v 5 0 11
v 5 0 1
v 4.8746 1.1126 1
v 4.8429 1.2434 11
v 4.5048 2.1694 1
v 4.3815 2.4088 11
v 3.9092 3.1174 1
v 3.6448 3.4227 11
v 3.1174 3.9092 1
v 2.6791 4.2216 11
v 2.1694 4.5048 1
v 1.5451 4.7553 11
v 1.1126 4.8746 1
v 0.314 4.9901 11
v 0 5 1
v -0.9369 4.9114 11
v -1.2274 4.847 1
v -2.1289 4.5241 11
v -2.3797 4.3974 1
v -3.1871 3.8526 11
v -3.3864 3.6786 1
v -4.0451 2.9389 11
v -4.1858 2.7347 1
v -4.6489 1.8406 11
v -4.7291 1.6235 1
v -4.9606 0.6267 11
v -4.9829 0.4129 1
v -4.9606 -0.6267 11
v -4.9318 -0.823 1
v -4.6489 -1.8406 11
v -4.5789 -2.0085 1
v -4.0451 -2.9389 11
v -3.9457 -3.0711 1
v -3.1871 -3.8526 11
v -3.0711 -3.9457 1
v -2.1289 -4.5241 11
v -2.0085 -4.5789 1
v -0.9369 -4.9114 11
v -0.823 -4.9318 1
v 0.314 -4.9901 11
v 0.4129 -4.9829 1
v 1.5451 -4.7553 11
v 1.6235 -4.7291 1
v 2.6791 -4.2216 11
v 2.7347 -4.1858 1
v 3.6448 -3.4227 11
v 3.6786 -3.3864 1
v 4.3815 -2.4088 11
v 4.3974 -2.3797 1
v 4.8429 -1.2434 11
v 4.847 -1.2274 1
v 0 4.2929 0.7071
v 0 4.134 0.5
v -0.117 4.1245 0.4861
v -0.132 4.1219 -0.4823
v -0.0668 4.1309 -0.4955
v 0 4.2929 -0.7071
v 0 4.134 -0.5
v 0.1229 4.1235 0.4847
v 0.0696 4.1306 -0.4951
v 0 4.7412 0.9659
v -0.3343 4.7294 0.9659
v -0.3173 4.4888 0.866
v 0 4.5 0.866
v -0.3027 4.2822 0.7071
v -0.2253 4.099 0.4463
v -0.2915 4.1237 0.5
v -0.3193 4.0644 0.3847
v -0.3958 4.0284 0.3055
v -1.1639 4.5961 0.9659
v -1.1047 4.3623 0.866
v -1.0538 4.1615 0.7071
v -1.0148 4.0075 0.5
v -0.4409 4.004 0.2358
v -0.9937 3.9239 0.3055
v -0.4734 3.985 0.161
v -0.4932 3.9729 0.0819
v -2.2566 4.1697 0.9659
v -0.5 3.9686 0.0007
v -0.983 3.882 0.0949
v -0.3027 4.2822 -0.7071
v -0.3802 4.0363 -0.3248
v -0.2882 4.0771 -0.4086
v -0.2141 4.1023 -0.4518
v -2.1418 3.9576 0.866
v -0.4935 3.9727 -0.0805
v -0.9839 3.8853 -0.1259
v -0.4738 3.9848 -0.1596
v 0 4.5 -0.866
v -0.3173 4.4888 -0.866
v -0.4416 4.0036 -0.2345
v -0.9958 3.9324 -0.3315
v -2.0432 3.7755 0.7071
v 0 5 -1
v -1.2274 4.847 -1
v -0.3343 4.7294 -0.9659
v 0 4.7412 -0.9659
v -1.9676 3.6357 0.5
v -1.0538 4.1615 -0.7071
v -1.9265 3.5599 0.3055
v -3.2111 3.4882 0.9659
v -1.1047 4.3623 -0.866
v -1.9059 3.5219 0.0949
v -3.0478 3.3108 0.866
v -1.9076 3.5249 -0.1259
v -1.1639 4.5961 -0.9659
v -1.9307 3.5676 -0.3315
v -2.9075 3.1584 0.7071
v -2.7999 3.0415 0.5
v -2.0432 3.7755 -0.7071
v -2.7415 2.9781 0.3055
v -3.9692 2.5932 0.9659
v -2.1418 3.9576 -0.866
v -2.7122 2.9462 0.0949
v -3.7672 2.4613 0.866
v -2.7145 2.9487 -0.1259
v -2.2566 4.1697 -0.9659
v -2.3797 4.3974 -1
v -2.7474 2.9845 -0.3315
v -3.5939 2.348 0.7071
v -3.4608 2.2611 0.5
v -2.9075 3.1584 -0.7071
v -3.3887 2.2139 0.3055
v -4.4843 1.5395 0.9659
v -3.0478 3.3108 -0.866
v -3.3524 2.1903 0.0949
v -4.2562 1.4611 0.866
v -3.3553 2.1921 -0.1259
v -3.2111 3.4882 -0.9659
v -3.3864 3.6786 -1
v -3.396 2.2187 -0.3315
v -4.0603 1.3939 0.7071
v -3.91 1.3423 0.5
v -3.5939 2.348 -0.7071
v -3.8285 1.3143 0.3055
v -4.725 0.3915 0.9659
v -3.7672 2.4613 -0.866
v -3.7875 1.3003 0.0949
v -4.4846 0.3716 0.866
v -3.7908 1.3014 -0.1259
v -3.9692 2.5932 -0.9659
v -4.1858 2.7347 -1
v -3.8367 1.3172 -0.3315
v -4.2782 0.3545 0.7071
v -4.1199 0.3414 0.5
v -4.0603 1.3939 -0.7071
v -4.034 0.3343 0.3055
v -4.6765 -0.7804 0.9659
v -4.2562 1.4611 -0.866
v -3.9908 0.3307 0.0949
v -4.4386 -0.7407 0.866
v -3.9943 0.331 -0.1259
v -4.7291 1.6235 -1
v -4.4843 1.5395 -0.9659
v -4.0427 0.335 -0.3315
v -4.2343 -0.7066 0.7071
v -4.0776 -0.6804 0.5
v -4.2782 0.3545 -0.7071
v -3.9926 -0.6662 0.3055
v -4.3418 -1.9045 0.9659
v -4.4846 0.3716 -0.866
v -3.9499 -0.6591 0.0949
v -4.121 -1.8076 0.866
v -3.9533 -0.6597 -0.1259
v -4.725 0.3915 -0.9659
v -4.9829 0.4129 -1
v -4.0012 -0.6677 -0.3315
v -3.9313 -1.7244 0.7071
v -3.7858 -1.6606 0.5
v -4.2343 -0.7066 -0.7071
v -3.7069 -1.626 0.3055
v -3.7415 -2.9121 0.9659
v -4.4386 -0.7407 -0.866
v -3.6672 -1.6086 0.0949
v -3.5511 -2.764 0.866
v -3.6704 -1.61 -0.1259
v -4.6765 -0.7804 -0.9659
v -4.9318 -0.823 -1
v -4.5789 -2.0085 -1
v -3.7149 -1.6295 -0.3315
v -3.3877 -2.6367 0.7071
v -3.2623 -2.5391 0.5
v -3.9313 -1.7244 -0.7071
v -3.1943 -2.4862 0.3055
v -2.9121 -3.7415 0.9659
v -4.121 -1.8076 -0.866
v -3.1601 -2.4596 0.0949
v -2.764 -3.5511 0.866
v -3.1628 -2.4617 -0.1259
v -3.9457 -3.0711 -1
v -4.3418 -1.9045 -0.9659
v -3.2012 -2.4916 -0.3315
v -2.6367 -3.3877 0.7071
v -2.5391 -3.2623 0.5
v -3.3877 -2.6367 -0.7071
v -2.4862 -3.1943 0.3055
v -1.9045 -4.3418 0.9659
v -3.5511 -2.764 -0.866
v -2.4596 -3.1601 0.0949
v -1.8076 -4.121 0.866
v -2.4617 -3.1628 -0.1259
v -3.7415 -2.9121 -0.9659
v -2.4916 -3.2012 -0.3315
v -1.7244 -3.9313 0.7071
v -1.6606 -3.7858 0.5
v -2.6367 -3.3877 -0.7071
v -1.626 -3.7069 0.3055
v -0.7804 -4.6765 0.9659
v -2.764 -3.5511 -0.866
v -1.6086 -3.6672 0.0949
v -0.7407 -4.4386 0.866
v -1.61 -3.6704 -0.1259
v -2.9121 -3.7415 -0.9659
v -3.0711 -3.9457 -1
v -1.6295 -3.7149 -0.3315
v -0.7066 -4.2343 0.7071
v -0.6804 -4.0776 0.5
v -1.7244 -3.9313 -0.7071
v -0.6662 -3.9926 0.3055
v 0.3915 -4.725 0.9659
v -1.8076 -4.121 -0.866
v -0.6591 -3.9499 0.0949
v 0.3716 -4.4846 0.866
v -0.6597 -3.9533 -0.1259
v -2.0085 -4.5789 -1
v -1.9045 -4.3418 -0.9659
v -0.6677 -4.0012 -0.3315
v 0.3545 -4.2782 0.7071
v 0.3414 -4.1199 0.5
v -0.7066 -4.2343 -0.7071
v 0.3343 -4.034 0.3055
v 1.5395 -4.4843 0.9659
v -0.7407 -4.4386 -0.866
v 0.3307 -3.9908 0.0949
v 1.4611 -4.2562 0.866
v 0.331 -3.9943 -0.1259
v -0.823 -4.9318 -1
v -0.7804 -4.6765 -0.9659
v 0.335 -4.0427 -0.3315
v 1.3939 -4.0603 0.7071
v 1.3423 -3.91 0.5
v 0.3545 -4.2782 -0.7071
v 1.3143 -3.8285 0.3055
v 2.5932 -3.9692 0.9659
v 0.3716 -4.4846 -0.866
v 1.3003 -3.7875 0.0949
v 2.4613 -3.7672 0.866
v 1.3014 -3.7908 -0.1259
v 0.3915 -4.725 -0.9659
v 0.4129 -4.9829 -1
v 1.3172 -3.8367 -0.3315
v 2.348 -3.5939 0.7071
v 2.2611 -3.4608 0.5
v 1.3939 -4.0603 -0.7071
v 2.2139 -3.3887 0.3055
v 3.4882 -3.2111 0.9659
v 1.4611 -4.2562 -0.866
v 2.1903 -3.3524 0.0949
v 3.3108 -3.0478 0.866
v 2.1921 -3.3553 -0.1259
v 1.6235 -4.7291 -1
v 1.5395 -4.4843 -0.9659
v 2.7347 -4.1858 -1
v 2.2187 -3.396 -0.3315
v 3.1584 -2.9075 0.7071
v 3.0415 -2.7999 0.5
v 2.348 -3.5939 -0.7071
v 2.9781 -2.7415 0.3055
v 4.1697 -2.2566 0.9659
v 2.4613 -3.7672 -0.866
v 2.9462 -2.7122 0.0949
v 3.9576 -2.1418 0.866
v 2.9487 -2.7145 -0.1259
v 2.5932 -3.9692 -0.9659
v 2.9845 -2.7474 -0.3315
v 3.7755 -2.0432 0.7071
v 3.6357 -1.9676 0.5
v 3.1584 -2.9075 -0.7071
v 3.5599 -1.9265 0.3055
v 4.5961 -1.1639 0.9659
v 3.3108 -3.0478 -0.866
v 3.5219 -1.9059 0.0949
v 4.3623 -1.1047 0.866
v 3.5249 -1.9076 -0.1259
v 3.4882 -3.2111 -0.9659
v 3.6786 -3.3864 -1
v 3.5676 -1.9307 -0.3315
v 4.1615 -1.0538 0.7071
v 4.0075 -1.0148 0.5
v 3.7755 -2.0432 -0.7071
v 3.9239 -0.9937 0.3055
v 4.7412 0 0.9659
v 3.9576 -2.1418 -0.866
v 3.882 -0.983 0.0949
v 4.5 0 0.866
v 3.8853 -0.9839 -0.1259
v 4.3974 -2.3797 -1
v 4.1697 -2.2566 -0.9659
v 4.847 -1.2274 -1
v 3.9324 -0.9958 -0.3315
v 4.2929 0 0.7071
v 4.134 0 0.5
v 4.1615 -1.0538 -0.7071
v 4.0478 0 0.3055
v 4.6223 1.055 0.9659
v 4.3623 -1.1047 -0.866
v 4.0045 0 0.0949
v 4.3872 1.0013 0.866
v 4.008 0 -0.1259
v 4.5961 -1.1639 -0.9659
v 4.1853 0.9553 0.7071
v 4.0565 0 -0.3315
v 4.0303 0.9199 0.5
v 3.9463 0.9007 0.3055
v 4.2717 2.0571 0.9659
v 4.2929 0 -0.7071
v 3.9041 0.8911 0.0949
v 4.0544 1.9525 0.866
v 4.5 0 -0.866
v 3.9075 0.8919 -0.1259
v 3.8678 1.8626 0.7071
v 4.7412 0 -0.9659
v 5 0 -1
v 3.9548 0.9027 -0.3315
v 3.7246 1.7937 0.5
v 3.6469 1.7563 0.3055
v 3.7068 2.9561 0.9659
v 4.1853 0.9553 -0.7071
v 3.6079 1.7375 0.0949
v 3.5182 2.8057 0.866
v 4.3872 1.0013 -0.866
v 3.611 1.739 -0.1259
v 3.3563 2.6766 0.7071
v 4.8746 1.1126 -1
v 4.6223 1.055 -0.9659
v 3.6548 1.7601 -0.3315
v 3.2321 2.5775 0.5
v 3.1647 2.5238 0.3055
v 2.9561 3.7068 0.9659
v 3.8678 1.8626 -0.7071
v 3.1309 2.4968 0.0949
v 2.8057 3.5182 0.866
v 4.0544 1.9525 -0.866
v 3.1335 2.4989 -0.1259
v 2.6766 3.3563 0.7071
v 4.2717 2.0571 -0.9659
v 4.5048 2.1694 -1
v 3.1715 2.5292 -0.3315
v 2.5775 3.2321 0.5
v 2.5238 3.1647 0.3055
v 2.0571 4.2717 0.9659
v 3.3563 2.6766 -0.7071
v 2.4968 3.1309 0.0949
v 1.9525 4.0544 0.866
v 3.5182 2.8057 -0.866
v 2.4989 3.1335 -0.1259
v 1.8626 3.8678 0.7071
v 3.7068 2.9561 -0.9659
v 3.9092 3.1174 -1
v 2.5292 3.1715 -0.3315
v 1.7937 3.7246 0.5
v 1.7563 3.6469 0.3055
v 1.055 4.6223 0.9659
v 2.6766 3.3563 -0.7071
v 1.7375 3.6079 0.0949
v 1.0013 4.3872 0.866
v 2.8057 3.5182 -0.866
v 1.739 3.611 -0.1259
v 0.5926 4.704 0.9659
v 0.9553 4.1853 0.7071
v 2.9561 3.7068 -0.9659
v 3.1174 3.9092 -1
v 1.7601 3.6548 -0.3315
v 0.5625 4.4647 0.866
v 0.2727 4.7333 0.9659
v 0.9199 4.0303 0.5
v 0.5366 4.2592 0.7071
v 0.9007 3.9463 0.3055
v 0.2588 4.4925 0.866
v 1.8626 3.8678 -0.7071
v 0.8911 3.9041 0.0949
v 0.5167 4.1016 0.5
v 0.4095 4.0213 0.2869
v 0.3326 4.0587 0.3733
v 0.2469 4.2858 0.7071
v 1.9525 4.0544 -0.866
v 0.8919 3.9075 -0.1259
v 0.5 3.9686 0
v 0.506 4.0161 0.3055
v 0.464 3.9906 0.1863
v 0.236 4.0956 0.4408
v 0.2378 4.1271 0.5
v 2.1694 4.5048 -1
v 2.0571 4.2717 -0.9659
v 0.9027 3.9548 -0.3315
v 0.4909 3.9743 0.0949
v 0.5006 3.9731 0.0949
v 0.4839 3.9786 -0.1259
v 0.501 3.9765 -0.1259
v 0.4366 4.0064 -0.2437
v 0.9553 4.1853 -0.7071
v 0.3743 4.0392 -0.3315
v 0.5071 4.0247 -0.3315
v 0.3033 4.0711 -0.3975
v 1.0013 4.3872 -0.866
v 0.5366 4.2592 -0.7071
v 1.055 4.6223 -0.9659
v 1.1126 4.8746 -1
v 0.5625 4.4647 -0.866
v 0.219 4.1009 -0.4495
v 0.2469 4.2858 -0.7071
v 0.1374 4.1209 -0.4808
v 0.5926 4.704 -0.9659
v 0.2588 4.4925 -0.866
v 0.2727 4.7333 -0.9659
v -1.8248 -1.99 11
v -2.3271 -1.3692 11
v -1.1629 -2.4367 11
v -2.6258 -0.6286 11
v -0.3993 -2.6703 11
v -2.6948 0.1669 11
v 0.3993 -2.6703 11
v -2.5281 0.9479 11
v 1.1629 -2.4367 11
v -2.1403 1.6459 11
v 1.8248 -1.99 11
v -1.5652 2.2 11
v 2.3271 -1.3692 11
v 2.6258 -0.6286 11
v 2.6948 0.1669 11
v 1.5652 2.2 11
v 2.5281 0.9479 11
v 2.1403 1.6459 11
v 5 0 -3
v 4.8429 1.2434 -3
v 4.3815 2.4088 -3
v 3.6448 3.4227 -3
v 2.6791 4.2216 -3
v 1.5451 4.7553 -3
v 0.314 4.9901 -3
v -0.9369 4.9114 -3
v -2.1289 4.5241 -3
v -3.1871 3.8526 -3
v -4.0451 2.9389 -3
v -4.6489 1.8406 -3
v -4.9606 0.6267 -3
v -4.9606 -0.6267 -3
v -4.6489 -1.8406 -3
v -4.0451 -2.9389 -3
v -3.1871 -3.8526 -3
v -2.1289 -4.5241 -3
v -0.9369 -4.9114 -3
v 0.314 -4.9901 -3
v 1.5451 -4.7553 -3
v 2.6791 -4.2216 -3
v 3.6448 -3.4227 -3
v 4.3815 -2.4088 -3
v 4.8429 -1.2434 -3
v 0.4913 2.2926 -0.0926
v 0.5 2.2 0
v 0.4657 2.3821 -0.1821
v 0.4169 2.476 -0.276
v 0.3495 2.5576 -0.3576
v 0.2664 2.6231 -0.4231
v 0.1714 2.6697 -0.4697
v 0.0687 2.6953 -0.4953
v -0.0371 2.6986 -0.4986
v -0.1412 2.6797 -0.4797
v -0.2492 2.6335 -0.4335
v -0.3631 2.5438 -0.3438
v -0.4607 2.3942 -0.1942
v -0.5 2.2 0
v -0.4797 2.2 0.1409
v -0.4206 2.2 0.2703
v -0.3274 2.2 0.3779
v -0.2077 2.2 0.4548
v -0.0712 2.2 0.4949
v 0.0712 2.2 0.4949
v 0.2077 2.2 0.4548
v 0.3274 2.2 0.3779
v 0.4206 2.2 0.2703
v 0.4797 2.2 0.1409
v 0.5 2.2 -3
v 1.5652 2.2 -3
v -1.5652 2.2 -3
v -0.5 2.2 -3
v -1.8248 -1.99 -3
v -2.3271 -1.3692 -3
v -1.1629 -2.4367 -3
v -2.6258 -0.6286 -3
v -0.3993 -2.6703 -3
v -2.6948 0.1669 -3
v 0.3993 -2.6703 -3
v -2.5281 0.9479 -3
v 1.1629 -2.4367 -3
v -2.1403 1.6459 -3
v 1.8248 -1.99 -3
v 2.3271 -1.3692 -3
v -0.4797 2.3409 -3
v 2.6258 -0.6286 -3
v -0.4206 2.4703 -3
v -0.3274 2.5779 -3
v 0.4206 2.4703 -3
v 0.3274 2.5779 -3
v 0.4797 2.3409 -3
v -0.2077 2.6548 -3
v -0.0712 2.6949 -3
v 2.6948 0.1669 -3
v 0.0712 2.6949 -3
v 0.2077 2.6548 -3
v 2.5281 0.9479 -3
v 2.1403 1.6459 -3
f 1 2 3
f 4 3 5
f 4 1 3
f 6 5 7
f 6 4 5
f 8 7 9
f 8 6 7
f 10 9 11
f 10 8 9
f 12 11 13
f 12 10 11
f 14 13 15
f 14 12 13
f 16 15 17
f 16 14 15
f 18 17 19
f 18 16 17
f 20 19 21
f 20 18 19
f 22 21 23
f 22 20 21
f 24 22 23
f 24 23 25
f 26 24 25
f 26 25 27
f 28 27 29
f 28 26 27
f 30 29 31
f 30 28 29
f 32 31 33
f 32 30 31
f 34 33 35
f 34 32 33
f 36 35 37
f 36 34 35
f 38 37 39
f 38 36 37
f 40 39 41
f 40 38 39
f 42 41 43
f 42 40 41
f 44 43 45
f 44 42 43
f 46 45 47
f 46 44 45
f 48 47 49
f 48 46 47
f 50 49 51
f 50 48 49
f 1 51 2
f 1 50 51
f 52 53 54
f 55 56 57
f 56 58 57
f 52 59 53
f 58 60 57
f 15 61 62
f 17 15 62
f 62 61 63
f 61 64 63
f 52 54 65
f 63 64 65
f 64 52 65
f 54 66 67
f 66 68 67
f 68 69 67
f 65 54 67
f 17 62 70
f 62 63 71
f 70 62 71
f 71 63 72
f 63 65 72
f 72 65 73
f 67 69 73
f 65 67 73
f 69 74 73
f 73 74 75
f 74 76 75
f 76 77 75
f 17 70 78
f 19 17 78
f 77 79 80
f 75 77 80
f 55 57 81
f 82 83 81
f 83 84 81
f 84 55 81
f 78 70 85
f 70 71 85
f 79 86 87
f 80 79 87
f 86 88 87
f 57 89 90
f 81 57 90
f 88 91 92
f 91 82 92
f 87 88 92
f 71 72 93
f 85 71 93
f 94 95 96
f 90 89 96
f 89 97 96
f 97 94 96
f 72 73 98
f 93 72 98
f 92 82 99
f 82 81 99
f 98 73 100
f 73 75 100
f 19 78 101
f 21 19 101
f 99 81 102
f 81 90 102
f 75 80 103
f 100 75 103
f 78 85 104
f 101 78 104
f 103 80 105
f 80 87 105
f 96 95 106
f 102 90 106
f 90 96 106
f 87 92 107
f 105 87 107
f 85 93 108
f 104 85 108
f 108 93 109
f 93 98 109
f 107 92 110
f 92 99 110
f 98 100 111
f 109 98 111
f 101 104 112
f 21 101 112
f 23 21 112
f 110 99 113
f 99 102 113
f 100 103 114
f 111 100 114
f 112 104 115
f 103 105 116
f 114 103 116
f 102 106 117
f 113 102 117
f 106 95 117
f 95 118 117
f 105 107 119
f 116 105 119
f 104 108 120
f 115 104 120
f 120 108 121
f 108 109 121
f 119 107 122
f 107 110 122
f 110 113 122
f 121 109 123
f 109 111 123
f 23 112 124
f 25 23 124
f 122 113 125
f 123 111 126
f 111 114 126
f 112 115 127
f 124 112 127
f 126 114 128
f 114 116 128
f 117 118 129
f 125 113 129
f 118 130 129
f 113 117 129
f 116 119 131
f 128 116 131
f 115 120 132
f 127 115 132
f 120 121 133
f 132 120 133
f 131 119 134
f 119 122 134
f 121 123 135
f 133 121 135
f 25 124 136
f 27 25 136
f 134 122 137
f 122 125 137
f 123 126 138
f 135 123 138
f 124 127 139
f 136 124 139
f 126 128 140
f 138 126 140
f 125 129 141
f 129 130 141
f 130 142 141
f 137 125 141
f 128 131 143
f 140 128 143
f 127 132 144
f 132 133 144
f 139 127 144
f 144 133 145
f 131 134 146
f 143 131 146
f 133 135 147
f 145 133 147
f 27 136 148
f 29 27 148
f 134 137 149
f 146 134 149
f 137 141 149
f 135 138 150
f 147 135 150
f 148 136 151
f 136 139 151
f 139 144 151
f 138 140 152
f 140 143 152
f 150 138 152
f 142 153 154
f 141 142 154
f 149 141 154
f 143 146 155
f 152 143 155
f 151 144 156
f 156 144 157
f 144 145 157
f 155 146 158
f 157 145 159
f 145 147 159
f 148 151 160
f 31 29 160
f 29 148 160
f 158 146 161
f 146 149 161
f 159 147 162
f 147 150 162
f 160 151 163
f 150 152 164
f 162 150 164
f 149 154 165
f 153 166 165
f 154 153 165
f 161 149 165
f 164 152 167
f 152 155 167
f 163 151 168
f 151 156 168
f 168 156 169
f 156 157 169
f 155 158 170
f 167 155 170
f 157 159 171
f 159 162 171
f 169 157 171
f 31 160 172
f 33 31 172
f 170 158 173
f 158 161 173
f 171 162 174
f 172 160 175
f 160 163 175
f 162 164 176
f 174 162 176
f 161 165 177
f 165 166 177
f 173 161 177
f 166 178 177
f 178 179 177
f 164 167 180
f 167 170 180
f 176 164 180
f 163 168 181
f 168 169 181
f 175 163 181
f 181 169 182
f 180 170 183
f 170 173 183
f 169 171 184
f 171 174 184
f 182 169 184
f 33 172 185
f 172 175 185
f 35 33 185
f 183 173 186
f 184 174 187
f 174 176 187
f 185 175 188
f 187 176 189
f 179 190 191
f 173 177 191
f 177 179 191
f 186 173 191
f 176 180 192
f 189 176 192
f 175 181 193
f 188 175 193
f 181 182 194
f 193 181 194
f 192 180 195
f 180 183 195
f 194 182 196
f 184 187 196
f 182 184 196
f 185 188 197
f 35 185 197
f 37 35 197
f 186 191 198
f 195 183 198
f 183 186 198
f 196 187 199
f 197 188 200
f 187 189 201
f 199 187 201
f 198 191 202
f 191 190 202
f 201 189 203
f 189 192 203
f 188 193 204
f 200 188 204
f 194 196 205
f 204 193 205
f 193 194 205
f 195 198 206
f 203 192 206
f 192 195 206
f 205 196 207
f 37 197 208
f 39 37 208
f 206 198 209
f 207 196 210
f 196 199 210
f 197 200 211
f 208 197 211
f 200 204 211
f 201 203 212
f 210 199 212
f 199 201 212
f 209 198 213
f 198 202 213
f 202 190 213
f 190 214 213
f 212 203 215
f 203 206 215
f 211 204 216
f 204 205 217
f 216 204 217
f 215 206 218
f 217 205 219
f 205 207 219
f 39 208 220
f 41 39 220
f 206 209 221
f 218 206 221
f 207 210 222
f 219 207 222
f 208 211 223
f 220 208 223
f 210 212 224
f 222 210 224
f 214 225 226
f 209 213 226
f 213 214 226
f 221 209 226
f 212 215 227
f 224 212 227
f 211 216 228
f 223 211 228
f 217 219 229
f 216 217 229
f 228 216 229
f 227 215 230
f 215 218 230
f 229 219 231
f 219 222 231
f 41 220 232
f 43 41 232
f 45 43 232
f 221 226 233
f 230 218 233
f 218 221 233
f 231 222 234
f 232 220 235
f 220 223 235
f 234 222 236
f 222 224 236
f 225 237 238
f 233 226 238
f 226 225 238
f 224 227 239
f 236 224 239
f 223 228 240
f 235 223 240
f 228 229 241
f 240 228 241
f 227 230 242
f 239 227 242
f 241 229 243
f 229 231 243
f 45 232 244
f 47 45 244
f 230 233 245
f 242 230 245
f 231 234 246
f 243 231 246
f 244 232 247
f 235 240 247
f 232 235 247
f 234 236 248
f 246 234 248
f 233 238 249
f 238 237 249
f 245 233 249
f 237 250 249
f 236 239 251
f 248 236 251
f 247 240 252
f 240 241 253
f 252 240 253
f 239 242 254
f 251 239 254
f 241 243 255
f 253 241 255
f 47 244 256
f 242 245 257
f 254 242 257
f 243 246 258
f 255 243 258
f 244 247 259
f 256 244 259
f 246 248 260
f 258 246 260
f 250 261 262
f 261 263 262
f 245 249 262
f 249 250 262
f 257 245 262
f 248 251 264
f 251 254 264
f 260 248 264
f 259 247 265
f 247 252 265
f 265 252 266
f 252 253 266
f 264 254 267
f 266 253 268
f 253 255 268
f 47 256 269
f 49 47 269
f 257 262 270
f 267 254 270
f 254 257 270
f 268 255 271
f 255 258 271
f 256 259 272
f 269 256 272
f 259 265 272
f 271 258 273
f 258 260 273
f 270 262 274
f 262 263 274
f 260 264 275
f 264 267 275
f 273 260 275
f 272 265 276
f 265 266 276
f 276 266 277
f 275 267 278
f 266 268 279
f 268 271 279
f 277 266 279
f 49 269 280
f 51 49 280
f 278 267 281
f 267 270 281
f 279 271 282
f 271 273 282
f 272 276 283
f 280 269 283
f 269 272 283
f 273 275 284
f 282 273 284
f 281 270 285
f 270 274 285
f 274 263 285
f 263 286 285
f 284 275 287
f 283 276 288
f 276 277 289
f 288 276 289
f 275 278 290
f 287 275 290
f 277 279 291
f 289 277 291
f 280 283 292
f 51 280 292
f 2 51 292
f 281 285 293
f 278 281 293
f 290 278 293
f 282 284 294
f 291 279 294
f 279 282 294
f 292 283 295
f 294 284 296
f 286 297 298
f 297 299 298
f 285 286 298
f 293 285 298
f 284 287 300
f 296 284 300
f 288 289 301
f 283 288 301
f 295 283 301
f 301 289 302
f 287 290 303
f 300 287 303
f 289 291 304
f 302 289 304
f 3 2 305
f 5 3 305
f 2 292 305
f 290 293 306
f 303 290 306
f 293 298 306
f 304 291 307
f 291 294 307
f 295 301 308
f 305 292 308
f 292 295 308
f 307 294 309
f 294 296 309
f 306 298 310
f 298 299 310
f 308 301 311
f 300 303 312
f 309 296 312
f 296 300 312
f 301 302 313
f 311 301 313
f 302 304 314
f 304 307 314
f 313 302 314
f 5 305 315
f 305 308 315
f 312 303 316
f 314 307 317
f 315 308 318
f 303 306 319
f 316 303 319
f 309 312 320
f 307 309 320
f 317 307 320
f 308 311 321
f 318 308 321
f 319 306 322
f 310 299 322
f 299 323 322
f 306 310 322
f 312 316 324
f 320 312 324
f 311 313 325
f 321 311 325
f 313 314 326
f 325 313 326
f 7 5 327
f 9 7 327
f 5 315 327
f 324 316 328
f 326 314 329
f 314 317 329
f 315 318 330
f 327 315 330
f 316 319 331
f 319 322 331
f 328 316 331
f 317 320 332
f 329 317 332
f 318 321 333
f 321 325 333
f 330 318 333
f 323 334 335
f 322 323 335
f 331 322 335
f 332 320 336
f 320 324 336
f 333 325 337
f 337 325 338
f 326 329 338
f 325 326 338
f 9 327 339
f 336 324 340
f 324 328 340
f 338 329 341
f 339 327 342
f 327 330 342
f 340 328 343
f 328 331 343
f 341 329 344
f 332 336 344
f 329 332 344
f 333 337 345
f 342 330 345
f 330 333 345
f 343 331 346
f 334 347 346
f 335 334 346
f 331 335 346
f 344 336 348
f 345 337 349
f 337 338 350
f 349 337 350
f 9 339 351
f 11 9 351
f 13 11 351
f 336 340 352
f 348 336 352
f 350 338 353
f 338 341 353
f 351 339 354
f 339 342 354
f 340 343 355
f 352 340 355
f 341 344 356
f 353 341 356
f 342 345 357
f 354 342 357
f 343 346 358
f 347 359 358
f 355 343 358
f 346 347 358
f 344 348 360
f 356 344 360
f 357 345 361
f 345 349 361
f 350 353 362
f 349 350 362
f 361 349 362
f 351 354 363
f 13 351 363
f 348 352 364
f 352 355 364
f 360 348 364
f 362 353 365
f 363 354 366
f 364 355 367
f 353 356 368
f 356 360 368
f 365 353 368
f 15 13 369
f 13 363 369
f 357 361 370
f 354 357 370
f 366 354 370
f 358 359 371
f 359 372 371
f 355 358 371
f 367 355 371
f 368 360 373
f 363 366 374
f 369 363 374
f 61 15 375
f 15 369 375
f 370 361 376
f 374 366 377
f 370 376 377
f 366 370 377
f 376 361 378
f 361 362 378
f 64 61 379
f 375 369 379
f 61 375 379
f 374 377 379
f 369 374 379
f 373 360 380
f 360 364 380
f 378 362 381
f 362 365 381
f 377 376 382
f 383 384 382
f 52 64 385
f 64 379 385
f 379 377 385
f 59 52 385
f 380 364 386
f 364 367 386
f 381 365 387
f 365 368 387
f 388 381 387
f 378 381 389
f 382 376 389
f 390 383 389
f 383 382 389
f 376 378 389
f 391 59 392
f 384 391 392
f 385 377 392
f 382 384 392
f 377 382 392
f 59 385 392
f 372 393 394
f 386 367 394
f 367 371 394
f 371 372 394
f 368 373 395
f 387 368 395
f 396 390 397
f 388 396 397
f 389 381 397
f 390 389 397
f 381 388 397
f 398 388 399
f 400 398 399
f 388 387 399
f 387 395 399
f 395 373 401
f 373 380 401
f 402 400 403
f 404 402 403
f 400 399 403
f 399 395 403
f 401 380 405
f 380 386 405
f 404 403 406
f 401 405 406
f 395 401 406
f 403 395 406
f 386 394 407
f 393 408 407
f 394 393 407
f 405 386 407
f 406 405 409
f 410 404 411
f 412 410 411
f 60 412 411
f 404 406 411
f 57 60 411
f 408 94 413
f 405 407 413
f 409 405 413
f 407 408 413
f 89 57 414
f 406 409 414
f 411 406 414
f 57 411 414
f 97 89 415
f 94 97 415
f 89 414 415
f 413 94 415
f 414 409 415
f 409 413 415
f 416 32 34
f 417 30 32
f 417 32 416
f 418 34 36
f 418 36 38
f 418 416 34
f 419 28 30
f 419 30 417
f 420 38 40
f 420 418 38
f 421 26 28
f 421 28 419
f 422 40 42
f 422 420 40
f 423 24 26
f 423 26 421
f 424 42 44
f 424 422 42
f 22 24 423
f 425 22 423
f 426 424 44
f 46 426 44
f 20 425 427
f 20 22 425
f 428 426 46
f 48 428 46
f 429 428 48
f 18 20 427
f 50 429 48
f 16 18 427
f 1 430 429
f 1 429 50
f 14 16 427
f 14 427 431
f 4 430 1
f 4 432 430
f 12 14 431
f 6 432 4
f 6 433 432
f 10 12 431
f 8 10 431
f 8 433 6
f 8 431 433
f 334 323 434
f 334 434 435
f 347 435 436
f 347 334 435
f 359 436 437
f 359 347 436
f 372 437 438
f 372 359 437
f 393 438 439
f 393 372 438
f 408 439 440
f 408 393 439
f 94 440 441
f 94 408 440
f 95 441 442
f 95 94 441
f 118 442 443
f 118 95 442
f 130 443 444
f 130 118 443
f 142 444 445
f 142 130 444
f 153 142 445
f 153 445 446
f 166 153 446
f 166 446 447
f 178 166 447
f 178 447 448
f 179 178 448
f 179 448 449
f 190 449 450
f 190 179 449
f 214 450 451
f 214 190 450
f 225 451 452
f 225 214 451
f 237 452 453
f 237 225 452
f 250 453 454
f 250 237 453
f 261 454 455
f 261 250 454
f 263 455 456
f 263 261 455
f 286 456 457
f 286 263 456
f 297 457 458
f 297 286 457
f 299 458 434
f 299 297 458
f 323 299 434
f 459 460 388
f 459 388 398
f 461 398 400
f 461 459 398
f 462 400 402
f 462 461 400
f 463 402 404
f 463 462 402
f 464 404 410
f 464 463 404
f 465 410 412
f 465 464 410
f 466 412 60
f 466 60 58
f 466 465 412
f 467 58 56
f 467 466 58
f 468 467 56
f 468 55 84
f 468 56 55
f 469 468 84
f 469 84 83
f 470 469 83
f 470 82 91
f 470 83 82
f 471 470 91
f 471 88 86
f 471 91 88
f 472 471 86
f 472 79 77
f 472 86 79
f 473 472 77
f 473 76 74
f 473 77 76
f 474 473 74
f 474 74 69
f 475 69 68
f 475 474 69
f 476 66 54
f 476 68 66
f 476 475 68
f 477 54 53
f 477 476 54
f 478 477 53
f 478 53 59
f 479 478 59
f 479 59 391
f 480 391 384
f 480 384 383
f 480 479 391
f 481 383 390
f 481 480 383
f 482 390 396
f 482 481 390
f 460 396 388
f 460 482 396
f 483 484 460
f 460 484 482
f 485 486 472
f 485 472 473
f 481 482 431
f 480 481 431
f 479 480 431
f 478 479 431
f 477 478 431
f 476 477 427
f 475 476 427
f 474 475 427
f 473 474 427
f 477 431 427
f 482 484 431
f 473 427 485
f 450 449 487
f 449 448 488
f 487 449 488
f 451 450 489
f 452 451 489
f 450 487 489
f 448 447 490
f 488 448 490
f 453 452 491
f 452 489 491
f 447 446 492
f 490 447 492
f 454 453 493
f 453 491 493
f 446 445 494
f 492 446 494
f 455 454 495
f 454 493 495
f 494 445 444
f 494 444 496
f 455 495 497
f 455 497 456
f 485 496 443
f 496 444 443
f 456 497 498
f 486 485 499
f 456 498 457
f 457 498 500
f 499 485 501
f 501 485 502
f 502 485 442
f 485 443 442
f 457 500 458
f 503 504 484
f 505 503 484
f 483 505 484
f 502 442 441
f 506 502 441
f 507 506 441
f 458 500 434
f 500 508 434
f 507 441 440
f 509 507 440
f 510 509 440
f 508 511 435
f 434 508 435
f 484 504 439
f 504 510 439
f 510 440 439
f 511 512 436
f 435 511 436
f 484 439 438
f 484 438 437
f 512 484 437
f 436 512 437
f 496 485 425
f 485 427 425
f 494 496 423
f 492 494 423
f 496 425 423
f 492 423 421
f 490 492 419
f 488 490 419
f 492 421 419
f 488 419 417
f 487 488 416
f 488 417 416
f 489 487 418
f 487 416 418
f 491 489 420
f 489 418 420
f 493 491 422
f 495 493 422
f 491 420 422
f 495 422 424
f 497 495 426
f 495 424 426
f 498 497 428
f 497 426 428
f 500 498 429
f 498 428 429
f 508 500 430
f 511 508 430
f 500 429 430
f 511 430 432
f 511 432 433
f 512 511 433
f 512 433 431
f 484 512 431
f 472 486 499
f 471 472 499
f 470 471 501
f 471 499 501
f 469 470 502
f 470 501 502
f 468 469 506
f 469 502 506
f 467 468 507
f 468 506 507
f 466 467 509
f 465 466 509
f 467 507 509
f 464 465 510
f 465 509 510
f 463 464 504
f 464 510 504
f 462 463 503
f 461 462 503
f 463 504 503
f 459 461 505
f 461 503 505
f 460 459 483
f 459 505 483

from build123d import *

# Parameters (mm, degrees)
SKETCH1_R                = 5
BOSS_EXTRUDE1_DEPTH      = 11
BOSS_EXTRUDE1_DEPTH_BACK = 3
SKETCH3_R                = 0.5
CUT_EXTRUDE1_DEPTH       = 11
CUT_EXTRUDE2_DEPTH       = 3


with BuildPart() as part:
    # Sketch1 → Boss-Extrude1 (new body, two sides)
    with BuildSketch(Plane.XY) as boss_extrude1_sk:
        Circle(SKETCH1_R)
        with BuildLine():
            Line((1.565247584, 2.2), (-1.565247584, 2.2))
            ThreePointArc((-1.565247584, 2.2), (0, -2.7), (1.565247584, 2.2))
        make_face(mode=Mode.SUBTRACT)
    extrude(amount=BOSS_EXTRUDE1_DEPTH)
    extrude(boss_extrude1_sk.sketch, amount=-BOSS_EXTRUDE1_DEPTH_BACK)

    # Sketch2 → Cut-Revolve1 (revolve, cut)
    with BuildSketch(Plane(origin=(0, 0, 0), x_dir=(0, 0, -1), z_dir=(1, 0, 0))):
        with BuildLine():
            Line((1, 5), (-1, 5))
            ThreePointArc((-1, 5), (0, 4), (1, 5))
        make_face()
    revolve(axis=Axis((0, 0, 0), (0, 0, 1)), mode=Mode.SUBTRACT)

    # Sketch3 → Cut-Extrude1 (cut)
    with BuildSketch(Plane(origin=(0, 0, 0), x_dir=(1, 0, 0), z_dir=(0, 1, 0))):
        Circle(SKETCH3_R)
    extrude(amount=CUT_EXTRUDE1_DEPTH, mode=Mode.SUBTRACT)

    # Sketch4 → Cut-Extrude2 (cut)
    with BuildSketch(Plane(origin=(0, 0, -3), x_dir=(-1, 0, 0), z_dir=(0, 0, -1))):
        with BuildLine():
            Line((-0.5, 2.2), (0.5, 2.2))
            ThreePointArc((0.5, 2.2), (0, 2.7), (-0.5, 2.2))
        make_face()
    extrude(amount=-CUT_EXTRUDE2_DEPTH, mode=Mode.SUBTRACT)


solid = part.part
